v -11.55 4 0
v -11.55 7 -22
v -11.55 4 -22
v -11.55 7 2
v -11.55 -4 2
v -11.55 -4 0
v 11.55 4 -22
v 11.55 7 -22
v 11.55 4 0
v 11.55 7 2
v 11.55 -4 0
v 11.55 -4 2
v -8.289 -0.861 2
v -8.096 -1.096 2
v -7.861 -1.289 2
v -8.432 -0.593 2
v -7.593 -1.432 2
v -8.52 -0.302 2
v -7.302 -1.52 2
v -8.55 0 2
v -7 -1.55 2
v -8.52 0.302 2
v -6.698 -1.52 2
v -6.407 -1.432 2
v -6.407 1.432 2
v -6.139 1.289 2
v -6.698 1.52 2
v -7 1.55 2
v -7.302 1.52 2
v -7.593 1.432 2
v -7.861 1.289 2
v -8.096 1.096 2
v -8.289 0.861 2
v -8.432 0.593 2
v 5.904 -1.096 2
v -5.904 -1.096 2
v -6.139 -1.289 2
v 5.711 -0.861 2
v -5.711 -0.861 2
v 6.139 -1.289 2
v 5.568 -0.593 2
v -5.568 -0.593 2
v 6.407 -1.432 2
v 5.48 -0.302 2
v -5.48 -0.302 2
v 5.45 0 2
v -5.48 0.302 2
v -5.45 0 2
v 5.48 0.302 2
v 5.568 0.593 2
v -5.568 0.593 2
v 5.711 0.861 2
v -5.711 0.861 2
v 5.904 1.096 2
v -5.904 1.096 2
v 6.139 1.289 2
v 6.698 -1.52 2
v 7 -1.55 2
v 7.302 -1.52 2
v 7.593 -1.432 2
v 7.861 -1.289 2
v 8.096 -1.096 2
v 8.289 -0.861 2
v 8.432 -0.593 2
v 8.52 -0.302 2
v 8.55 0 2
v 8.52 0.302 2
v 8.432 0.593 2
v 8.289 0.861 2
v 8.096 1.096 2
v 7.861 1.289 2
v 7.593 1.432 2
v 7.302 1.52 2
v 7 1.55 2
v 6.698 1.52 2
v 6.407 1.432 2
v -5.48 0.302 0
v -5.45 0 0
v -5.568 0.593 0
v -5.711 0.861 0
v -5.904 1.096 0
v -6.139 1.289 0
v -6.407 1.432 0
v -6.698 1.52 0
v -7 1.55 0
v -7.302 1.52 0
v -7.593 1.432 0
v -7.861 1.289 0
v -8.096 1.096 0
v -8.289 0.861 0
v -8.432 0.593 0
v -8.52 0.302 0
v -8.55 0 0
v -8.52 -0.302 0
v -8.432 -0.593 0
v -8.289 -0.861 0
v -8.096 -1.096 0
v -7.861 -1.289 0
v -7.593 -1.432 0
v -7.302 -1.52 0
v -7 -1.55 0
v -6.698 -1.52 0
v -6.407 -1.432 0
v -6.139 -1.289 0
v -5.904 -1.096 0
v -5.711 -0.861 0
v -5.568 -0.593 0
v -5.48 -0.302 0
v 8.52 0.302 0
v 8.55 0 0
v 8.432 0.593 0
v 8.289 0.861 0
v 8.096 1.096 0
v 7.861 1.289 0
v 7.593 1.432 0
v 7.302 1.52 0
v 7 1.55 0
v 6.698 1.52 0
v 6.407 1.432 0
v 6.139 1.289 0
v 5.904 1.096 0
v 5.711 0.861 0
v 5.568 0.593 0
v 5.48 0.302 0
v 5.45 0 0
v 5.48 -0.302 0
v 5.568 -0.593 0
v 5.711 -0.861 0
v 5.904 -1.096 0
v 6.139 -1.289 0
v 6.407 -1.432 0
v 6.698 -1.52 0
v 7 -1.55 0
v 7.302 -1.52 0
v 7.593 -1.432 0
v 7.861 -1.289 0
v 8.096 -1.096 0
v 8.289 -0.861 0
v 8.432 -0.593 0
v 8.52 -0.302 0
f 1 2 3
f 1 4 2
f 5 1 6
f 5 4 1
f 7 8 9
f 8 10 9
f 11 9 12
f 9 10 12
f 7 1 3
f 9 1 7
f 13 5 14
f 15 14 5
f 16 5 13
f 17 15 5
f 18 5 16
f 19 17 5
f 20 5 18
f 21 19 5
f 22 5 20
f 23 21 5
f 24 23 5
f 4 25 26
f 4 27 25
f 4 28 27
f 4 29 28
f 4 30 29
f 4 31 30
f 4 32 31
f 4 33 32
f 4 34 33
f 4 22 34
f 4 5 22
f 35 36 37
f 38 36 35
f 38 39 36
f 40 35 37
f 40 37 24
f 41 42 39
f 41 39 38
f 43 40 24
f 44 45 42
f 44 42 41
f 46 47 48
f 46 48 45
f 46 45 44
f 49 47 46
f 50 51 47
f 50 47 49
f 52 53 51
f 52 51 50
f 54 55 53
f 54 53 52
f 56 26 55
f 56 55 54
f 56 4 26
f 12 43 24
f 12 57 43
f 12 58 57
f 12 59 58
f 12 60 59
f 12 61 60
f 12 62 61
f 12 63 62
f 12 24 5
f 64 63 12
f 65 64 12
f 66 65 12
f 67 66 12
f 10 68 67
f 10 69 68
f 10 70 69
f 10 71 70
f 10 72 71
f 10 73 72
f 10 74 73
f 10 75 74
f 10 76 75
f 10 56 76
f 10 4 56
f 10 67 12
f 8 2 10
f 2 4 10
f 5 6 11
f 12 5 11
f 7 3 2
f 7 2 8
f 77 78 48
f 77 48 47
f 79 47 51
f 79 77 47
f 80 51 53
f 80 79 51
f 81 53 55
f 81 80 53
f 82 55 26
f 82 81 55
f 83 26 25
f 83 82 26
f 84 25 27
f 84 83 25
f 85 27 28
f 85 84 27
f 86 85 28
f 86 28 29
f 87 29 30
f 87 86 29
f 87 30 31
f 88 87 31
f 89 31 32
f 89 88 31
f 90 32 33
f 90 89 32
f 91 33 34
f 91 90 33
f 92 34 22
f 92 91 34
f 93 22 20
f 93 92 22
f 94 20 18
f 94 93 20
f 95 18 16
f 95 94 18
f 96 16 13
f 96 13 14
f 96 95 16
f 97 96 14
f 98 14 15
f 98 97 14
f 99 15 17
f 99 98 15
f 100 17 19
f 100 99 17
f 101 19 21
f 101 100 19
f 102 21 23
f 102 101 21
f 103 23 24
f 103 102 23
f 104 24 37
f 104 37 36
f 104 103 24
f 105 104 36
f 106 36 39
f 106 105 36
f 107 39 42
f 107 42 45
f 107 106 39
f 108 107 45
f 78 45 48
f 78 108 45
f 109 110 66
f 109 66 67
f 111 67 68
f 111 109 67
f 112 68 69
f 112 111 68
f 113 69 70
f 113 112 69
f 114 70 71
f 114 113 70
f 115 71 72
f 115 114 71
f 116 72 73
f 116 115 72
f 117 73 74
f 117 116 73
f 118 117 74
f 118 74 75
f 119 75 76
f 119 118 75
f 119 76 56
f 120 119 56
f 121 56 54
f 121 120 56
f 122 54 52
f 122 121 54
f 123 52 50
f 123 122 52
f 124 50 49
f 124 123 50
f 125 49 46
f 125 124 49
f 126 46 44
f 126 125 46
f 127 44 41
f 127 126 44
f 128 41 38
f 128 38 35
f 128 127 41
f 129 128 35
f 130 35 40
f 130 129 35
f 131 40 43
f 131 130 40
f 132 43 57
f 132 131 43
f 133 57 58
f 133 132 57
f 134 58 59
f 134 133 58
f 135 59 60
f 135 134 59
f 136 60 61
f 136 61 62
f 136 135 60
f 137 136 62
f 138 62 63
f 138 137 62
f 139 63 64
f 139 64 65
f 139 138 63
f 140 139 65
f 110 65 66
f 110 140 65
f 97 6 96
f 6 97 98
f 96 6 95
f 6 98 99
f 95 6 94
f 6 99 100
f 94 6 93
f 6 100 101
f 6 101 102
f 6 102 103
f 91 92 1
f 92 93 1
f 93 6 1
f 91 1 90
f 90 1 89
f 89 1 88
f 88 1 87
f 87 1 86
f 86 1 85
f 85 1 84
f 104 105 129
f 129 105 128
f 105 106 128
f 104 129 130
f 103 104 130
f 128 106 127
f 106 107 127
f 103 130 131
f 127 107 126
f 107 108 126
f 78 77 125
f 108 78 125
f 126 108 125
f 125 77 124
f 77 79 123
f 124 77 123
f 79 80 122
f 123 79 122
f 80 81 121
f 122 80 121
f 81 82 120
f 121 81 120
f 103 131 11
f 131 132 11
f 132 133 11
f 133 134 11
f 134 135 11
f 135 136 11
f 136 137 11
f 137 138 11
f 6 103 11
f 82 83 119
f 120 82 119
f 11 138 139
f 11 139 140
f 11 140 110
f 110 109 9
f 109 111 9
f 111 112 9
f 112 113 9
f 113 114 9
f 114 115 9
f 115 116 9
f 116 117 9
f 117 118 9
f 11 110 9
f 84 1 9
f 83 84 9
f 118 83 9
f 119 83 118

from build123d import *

# Parameters (mm, degrees)
F0_W     = 23.1
F0_H     = 8
F0_R     = 1.55
F0_H_2   = 3
F1_DEPTH = 2
F2_W     = 23.1
F2_H     = 3
F3_DEPTH = 22


with BuildPart() as f1:
    # F0 (on Top) → F1 (new body)
    with BuildSketch(Plane.XY):
        Rectangle(F0_W, F0_H)
        with Locations((-7, 0)):
            Circle(F0_R, mode=Mode.SUBTRACT)
        with Locations((7, 0)):
            Circle(F0_R, mode=Mode.SUBTRACT)
        with Locations((0, 5.5)):
            Rectangle(F0_W, F0_H_2)
    extrude(amount=F1_DEPTH)

    # F2 (on face) → F3 (join)
    with BuildSketch(Plane(origin=(0, 0, 0), x_dir=(1, 0, 0), z_dir=(0, 0, -1))):
        with Locations((0, -5.5)):
            Rectangle(F2_W, F2_H)
    extrude(amount=F3_DEPTH)


solid = f1.part
